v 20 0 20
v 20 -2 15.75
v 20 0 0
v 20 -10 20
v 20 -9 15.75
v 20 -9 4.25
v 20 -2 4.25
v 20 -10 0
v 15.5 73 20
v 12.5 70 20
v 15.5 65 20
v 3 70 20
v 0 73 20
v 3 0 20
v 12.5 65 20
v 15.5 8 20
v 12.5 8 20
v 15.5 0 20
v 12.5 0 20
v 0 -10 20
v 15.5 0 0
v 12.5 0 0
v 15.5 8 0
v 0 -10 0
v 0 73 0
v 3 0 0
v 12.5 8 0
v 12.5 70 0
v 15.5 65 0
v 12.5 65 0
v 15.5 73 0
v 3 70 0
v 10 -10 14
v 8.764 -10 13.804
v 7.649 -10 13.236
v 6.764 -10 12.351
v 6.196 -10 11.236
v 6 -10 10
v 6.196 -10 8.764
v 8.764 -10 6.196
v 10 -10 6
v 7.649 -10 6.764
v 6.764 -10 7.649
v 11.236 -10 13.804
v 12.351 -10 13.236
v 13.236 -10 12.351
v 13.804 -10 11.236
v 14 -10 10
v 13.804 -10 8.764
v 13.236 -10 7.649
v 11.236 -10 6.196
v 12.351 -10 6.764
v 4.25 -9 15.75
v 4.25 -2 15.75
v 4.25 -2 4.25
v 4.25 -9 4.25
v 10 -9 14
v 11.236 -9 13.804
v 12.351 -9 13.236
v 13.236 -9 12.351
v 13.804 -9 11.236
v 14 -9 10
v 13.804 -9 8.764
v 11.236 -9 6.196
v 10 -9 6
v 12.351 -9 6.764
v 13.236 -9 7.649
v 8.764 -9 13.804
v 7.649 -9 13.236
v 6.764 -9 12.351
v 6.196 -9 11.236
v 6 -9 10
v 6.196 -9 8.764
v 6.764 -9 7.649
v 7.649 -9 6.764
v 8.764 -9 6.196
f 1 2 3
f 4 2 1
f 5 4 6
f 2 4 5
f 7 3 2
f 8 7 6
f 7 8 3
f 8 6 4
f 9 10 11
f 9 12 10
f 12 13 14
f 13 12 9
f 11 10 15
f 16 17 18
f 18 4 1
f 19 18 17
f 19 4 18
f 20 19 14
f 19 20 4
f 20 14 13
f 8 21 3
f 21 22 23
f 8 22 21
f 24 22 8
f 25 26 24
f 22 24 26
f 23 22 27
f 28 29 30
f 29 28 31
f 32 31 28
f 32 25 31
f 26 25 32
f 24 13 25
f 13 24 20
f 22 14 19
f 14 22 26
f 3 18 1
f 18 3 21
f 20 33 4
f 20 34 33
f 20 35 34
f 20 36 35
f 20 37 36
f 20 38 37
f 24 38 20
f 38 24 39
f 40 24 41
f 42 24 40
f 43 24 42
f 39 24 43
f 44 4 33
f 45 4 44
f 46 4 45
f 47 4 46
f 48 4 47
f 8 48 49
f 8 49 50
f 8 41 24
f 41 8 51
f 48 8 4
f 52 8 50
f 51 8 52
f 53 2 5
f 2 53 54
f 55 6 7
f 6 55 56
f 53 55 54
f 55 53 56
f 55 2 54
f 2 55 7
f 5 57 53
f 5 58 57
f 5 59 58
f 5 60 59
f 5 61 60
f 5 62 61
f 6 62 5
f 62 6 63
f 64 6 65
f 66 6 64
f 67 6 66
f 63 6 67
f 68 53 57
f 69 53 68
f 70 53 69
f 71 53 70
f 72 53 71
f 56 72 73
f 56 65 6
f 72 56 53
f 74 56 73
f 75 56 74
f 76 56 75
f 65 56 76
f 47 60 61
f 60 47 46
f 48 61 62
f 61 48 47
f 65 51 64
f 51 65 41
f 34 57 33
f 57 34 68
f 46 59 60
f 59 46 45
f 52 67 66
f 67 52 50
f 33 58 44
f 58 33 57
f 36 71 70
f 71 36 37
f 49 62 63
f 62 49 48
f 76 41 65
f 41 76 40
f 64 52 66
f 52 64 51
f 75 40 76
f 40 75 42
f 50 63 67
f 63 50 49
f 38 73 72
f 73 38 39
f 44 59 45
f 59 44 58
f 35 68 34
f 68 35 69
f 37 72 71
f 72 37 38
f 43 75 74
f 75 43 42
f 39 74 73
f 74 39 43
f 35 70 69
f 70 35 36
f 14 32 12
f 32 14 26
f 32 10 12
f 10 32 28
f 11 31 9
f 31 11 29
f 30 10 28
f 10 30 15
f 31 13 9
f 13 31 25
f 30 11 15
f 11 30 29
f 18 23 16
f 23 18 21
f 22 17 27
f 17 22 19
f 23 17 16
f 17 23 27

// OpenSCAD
//-------------------------------------------------------------
// Edit these two variables, according to your phone
//-------------------------------------------------------------
phone_width = 70;
phone_depth = 9.5;

//-------------------------------------------------------------

suppport_height = 20;        

// The support base is a simple longe rectangle
translate([0,0,0])
cube ([3, phone_width, suppport_height]);

// upper winglet, to hold the phone
translate([phone_depth + 3, phone_width-5, 0])
cube ([3, 8, suppport_height]);

// lower winglet, to hold the phone
translate([phone_depth + 3, 0, 0])
cube ([3, 8, suppport_height]);

// the piece connecting the support base to the winglet
translate([0, phone_width, 0])
cube ([phone_depth + 3, 3, suppport_height]);

nut_holder(10, suppport_height);

module nut_holder(box_height, box_side)
{
    //draw the nut holder:
    // This is a box rotated 90deg around X
    translate([0, -box_height, 0]) {        
        nut_width = 11.5; /* measured xy when nut is on a table */
        nut_height = 7; /* measured z when nut is on a table */
            
        center = (box_side - nut_width) / 2;
        
        //translate([center, -3, center])
        //cube ([nut_width, 1, nut_width]);
        
        difference() {        
            // A box for the nut holder
            cube ([box_side, box_height, box_side]);
            
            // A rectangular hole, inside the box,
            // where we can put the nut
            translate([center, 1, center])
            cube ([box_side, nut_height, nut_width]);
            
            // A hole, thorugh that box, so we can insert the screw
            rotate([90, 0, 0])
            translate([box_side / 2, box_side / 2, -2])        
            cylinder(r1=4, r2=4, h=3, $fn=20);
        }
    }
}
